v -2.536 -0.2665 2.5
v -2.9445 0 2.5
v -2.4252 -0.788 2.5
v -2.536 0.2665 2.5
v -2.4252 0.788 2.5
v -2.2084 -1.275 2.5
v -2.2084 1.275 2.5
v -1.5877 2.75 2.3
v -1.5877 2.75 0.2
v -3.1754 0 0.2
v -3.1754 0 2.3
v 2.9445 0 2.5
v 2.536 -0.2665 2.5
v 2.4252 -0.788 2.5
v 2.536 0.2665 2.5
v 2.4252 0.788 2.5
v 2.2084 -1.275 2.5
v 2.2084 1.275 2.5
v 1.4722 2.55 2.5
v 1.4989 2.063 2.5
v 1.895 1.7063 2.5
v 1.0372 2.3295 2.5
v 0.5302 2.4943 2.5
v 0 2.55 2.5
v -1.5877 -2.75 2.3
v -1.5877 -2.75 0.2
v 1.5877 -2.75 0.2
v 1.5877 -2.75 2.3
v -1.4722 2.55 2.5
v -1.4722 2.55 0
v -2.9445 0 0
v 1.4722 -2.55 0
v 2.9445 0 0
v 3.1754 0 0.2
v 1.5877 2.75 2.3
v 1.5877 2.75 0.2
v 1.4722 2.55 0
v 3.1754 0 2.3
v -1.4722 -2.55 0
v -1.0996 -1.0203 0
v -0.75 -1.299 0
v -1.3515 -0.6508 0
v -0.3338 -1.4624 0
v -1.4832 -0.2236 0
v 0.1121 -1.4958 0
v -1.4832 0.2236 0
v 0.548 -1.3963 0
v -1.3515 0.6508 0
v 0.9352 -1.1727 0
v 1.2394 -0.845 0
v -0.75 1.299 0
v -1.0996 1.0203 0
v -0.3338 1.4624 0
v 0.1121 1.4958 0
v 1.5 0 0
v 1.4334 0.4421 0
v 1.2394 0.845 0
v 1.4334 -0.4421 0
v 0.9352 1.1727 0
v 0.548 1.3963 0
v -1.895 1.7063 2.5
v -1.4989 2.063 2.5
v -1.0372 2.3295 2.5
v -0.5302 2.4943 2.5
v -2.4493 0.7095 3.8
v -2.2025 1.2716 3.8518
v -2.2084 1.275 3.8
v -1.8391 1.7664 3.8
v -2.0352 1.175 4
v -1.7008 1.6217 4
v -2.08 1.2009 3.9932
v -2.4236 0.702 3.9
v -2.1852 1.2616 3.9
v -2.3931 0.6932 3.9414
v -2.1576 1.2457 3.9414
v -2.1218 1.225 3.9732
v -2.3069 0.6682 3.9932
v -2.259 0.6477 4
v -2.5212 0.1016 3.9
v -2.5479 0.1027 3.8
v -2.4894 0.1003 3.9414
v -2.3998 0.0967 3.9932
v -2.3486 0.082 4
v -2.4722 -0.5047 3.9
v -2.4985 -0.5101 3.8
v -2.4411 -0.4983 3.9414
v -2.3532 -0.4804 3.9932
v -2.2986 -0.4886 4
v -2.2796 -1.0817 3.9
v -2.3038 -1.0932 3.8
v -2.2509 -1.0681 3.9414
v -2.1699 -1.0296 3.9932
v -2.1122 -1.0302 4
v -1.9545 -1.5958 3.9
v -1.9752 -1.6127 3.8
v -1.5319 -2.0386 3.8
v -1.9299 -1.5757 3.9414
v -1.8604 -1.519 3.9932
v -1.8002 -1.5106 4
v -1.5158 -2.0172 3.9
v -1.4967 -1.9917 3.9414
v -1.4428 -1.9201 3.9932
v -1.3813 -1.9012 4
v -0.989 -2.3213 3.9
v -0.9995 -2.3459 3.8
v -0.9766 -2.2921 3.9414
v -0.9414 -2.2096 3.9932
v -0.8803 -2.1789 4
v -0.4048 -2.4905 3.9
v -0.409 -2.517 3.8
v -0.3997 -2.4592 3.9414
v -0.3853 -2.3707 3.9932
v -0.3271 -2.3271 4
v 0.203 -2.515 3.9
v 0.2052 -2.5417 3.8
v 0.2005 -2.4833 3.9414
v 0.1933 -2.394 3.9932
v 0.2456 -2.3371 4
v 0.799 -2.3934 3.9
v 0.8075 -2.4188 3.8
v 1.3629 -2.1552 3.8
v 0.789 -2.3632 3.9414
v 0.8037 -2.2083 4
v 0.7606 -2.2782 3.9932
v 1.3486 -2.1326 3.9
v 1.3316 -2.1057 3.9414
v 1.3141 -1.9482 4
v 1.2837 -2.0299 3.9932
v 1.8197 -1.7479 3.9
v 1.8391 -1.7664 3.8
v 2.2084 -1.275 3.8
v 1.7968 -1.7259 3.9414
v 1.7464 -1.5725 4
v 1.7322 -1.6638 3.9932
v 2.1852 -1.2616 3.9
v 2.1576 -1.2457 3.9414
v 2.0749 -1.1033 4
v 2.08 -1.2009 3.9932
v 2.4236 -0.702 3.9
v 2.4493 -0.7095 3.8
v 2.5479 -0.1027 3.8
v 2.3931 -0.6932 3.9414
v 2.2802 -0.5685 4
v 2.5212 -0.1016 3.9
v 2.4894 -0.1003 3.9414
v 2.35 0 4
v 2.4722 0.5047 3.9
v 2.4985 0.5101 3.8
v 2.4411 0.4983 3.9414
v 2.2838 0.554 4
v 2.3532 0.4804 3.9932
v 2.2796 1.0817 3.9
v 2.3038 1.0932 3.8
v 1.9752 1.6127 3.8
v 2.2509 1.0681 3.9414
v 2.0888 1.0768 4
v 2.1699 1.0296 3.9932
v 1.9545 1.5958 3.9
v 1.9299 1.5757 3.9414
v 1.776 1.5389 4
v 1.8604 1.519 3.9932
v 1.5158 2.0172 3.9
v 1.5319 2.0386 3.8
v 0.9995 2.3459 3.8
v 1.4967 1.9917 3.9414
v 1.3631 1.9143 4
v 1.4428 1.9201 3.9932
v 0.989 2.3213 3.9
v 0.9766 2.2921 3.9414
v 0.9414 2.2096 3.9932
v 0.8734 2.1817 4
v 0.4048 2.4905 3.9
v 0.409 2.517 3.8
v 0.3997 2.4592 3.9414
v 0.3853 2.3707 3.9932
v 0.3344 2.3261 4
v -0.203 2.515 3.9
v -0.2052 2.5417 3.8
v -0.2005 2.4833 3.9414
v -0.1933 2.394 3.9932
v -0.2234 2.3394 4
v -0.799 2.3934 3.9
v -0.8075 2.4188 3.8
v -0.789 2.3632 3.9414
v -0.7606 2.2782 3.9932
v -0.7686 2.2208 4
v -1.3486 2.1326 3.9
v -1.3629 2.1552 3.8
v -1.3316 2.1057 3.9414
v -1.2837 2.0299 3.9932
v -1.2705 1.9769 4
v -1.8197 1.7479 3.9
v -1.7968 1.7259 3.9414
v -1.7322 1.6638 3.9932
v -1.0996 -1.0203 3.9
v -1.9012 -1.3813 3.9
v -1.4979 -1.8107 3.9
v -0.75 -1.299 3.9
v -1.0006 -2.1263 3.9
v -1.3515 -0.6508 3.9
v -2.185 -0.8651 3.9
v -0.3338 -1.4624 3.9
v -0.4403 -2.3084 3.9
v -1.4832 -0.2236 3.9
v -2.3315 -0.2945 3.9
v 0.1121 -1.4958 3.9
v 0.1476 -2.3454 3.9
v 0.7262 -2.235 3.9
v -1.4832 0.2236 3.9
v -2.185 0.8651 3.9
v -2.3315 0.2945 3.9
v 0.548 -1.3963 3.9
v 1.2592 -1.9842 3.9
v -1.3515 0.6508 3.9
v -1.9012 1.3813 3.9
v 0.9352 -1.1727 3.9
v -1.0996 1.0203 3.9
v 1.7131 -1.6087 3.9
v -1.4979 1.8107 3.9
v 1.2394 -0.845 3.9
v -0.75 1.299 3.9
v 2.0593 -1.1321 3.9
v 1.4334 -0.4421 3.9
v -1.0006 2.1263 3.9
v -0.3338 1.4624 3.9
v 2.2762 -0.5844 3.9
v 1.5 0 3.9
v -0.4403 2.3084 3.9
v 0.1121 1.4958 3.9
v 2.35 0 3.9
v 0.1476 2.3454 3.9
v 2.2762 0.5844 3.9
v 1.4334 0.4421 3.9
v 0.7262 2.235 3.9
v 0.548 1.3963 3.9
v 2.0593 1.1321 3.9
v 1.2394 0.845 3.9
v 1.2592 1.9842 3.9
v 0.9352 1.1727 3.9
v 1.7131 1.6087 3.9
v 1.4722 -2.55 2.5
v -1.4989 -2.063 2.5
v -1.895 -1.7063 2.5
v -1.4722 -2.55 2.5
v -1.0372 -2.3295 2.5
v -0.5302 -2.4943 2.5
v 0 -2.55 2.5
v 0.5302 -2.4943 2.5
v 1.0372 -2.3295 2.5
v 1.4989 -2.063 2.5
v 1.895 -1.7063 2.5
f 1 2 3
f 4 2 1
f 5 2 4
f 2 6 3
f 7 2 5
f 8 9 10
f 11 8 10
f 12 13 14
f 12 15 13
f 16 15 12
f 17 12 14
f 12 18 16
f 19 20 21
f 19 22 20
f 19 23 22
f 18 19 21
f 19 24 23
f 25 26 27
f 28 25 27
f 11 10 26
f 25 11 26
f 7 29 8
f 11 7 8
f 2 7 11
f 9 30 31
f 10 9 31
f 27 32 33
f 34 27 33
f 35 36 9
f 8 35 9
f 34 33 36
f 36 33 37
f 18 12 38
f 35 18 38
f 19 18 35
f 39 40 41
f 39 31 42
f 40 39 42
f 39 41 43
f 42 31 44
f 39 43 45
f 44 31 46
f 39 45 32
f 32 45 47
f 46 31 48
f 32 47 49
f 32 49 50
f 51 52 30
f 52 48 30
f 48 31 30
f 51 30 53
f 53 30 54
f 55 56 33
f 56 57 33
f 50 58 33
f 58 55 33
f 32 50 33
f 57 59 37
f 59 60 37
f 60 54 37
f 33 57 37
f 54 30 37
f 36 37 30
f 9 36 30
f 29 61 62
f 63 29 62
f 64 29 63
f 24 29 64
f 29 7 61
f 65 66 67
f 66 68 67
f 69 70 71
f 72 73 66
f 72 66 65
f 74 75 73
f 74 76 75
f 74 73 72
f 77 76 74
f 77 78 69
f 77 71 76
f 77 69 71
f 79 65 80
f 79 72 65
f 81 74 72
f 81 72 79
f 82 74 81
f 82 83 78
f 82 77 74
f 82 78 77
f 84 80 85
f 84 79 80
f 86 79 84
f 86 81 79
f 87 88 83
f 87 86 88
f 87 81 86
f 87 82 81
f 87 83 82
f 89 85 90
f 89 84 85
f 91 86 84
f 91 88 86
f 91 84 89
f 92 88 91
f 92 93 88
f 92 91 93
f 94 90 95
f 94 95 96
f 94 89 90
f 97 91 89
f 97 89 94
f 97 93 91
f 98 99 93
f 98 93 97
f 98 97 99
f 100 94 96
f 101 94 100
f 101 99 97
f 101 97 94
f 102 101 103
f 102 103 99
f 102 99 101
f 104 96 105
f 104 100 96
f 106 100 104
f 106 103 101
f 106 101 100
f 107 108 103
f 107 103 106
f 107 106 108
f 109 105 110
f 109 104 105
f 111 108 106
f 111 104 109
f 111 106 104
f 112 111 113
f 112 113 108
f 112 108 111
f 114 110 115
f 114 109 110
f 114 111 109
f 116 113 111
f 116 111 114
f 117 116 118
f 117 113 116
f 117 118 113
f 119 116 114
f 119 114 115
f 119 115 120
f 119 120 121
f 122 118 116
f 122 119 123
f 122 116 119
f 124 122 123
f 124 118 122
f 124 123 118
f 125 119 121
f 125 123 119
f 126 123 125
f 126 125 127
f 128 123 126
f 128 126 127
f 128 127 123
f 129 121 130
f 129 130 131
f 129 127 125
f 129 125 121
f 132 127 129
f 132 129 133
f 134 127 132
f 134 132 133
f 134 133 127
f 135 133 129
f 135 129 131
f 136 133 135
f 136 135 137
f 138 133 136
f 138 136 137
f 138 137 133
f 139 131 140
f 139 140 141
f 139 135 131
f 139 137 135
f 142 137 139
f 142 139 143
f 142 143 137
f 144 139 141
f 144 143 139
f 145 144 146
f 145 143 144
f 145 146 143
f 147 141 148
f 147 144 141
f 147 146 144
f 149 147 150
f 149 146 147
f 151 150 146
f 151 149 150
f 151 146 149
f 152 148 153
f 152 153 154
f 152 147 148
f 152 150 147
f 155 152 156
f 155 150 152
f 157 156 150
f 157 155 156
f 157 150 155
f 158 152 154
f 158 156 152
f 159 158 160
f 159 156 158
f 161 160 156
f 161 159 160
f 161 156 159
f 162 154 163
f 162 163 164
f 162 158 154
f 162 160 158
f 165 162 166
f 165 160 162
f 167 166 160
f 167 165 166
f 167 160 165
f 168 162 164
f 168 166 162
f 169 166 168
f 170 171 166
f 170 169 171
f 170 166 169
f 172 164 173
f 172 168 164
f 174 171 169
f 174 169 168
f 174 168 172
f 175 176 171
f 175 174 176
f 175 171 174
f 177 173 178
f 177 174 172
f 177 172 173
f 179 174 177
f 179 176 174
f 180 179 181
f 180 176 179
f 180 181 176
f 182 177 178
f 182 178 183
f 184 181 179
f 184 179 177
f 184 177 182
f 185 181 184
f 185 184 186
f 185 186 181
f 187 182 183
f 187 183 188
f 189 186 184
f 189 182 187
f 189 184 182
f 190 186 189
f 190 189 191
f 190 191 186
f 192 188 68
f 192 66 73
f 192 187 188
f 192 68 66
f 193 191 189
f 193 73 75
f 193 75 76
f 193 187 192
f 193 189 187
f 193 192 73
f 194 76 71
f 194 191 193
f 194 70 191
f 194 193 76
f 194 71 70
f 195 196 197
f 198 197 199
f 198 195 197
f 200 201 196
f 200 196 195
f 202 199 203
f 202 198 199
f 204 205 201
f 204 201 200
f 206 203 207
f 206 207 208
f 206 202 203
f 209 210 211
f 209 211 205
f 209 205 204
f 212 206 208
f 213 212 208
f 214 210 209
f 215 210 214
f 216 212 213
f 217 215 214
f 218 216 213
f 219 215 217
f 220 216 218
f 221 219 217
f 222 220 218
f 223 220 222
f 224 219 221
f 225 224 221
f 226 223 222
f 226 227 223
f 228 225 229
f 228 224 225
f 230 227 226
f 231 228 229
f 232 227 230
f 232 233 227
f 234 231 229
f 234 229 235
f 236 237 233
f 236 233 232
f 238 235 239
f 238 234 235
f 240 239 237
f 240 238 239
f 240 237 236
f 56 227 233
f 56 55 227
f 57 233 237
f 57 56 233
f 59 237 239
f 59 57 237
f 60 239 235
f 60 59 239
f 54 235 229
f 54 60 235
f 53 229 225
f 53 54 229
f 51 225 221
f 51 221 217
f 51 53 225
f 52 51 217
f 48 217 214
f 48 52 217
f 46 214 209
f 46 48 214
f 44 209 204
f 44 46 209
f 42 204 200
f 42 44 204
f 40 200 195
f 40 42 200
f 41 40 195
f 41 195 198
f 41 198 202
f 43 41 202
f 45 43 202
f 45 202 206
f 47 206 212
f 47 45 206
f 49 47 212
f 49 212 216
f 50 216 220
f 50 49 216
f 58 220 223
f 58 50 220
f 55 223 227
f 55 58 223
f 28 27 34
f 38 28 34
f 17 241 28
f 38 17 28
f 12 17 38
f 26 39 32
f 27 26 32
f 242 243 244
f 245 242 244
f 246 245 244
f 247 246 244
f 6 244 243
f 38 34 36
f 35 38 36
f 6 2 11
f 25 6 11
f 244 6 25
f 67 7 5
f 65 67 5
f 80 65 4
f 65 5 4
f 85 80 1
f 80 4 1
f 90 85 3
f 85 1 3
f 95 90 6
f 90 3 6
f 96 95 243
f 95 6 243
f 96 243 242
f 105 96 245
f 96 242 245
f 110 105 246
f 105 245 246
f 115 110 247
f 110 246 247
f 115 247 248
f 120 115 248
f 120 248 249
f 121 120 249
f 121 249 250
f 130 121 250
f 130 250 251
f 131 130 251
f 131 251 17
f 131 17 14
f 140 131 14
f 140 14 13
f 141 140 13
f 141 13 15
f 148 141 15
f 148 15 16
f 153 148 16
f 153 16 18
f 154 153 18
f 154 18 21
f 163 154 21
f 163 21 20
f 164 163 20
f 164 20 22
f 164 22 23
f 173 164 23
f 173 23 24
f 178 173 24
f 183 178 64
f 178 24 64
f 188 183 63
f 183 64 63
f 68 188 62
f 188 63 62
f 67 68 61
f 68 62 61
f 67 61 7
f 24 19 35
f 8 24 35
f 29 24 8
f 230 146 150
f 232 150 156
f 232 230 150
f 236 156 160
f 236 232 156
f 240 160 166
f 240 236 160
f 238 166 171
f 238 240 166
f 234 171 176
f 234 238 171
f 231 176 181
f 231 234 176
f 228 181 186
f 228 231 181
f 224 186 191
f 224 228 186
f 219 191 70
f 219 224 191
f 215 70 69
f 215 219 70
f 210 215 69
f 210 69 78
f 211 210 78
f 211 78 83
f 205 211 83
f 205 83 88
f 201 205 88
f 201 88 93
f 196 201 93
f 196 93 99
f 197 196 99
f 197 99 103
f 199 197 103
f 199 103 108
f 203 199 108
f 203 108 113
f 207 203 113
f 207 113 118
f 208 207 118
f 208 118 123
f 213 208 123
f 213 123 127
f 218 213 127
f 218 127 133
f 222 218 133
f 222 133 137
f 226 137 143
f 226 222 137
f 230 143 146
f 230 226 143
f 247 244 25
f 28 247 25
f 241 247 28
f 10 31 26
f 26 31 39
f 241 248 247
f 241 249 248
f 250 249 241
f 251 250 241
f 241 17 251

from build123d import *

# Parameters (mm, degrees)
SKETCH1_R           = 1.5
SHAPE_DEPTH         = 2.5
CHAMFER_2_SIZE      = 0.2
SKETCH2_R           = 2.55
SKETCH2_R_2         = 1.5
BOSS_EXTRUDE2_DEPTH = 1.5
FILLET1_R           = 0.2
CUT_EXTRUDE1_START  = -0.1
SKETCH3_R           = 2.35
SKETCH3_R_2         = 1.5
CUT_EXTRUDE1_DEPTH  = 0.1


with BuildPart() as part:
    # Sketch1 → Shape (new body)
    with BuildSketch(Plane.XY):
        Polygon((-1.58771324, -2.75), (1.58771324, -2.75), (3.175426481, 0), (1.58771324, 2.75), (-1.58771324, 2.75), (-3.175426481, 0), align=None)
        Circle(SKETCH1_R, mode=Mode.SUBTRACT)
    extrude(amount=SHAPE_DEPTH)

    # Chamfer 2
    chamfer_2_edges = [part.edges().sort_by_distance(p)[0] for p in [
        (2.38156986, -1.375, 2.5),
        (2.38156986, 1.375, 2.5),
        (0, 2.75, 2.5),
        (-2.38156986, 1.375, 2.5),
        (-2.38156986, -1.375, 2.5),
        (-2.38156986, 1.375, 0),
        (0, 2.75, 0),
        (2.38156986, 1.375, 0),
        (0, -2.75, 2.5),
        (2.38156986, -1.375, 0),
        (0, -2.75, 0),
        (-2.38156986, -1.375, 0),
    ]]
    chamfer(chamfer_2_edges, length=CHAMFER_2_SIZE)

    # Sketch2 → Boss-Extrude2 (add)
    with BuildSketch(Plane.XY.offset(2.5)):
        with Locations(Location((0, 0, 0), (0, 0, 150))):
            Circle(SKETCH2_R)
        Circle(SKETCH2_R_2, mode=Mode.SUBTRACT)
    extrude(amount=BOSS_EXTRUDE2_DEPTH)

    # Fillet1
    fillet1_edges = [part.edges().sort_by_distance(p)[0] for p in [
        (2.20836478, -1.275, 4),
    ]]
    fillet(fillet1_edges, radius=FILLET1_R)

    # Sketch3 → Cut-Extrude1 (cut)
    with BuildSketch(Plane.XY.offset(4).offset(CUT_EXTRUDE1_START)):
        Circle(SKETCH3_R)
        Circle(SKETCH3_R_2, mode=Mode.SUBTRACT)
    extrude(amount=CUT_EXTRUDE1_DEPTH, mode=Mode.SUBTRACT)


solid = part.part
